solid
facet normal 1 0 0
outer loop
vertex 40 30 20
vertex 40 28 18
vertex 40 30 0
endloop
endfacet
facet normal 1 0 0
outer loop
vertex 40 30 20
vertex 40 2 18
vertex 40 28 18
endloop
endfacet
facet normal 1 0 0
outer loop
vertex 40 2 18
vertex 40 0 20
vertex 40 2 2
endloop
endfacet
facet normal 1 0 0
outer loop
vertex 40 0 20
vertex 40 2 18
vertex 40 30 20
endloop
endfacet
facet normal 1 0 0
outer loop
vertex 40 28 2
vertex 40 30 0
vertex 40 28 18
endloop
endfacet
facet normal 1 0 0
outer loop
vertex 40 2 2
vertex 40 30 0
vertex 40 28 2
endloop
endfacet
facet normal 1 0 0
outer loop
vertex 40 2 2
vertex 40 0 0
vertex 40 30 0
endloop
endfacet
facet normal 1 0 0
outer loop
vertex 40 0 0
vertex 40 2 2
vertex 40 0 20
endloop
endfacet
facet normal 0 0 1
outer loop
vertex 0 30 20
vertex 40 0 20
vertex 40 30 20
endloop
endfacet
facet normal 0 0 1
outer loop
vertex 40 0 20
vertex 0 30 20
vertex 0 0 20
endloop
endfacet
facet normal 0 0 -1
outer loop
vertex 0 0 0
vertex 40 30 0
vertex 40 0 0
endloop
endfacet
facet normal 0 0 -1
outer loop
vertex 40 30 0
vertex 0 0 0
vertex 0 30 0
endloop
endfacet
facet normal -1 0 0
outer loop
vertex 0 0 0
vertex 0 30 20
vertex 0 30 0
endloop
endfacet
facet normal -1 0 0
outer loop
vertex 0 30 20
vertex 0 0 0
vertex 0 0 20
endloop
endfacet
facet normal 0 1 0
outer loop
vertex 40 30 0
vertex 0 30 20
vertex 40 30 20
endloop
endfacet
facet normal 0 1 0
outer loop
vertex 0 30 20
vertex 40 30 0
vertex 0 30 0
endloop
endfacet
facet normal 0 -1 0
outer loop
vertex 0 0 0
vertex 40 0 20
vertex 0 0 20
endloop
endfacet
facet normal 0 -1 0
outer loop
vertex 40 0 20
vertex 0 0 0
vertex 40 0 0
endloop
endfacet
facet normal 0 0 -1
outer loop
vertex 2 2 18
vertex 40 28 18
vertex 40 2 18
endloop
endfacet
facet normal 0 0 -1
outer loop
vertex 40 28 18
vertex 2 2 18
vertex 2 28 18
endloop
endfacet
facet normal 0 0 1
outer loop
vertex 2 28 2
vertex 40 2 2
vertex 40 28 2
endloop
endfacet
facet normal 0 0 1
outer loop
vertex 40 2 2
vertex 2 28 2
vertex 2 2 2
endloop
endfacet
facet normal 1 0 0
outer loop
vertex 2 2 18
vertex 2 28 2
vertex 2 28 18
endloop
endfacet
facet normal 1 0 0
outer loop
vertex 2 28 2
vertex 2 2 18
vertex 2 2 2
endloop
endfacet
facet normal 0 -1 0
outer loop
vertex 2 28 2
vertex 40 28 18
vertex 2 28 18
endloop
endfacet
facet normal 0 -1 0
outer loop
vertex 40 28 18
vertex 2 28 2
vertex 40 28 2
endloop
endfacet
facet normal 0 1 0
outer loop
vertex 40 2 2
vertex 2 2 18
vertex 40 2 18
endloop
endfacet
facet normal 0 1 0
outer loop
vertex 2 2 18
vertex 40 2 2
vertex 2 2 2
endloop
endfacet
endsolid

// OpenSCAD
// units=mm — generated by scad_emitter.py
// part=unnamed
$fn = 48;

difference() { cube([40, 30, 20]); translate([2, 2, 2]) cube([40, 26, 16]); }
